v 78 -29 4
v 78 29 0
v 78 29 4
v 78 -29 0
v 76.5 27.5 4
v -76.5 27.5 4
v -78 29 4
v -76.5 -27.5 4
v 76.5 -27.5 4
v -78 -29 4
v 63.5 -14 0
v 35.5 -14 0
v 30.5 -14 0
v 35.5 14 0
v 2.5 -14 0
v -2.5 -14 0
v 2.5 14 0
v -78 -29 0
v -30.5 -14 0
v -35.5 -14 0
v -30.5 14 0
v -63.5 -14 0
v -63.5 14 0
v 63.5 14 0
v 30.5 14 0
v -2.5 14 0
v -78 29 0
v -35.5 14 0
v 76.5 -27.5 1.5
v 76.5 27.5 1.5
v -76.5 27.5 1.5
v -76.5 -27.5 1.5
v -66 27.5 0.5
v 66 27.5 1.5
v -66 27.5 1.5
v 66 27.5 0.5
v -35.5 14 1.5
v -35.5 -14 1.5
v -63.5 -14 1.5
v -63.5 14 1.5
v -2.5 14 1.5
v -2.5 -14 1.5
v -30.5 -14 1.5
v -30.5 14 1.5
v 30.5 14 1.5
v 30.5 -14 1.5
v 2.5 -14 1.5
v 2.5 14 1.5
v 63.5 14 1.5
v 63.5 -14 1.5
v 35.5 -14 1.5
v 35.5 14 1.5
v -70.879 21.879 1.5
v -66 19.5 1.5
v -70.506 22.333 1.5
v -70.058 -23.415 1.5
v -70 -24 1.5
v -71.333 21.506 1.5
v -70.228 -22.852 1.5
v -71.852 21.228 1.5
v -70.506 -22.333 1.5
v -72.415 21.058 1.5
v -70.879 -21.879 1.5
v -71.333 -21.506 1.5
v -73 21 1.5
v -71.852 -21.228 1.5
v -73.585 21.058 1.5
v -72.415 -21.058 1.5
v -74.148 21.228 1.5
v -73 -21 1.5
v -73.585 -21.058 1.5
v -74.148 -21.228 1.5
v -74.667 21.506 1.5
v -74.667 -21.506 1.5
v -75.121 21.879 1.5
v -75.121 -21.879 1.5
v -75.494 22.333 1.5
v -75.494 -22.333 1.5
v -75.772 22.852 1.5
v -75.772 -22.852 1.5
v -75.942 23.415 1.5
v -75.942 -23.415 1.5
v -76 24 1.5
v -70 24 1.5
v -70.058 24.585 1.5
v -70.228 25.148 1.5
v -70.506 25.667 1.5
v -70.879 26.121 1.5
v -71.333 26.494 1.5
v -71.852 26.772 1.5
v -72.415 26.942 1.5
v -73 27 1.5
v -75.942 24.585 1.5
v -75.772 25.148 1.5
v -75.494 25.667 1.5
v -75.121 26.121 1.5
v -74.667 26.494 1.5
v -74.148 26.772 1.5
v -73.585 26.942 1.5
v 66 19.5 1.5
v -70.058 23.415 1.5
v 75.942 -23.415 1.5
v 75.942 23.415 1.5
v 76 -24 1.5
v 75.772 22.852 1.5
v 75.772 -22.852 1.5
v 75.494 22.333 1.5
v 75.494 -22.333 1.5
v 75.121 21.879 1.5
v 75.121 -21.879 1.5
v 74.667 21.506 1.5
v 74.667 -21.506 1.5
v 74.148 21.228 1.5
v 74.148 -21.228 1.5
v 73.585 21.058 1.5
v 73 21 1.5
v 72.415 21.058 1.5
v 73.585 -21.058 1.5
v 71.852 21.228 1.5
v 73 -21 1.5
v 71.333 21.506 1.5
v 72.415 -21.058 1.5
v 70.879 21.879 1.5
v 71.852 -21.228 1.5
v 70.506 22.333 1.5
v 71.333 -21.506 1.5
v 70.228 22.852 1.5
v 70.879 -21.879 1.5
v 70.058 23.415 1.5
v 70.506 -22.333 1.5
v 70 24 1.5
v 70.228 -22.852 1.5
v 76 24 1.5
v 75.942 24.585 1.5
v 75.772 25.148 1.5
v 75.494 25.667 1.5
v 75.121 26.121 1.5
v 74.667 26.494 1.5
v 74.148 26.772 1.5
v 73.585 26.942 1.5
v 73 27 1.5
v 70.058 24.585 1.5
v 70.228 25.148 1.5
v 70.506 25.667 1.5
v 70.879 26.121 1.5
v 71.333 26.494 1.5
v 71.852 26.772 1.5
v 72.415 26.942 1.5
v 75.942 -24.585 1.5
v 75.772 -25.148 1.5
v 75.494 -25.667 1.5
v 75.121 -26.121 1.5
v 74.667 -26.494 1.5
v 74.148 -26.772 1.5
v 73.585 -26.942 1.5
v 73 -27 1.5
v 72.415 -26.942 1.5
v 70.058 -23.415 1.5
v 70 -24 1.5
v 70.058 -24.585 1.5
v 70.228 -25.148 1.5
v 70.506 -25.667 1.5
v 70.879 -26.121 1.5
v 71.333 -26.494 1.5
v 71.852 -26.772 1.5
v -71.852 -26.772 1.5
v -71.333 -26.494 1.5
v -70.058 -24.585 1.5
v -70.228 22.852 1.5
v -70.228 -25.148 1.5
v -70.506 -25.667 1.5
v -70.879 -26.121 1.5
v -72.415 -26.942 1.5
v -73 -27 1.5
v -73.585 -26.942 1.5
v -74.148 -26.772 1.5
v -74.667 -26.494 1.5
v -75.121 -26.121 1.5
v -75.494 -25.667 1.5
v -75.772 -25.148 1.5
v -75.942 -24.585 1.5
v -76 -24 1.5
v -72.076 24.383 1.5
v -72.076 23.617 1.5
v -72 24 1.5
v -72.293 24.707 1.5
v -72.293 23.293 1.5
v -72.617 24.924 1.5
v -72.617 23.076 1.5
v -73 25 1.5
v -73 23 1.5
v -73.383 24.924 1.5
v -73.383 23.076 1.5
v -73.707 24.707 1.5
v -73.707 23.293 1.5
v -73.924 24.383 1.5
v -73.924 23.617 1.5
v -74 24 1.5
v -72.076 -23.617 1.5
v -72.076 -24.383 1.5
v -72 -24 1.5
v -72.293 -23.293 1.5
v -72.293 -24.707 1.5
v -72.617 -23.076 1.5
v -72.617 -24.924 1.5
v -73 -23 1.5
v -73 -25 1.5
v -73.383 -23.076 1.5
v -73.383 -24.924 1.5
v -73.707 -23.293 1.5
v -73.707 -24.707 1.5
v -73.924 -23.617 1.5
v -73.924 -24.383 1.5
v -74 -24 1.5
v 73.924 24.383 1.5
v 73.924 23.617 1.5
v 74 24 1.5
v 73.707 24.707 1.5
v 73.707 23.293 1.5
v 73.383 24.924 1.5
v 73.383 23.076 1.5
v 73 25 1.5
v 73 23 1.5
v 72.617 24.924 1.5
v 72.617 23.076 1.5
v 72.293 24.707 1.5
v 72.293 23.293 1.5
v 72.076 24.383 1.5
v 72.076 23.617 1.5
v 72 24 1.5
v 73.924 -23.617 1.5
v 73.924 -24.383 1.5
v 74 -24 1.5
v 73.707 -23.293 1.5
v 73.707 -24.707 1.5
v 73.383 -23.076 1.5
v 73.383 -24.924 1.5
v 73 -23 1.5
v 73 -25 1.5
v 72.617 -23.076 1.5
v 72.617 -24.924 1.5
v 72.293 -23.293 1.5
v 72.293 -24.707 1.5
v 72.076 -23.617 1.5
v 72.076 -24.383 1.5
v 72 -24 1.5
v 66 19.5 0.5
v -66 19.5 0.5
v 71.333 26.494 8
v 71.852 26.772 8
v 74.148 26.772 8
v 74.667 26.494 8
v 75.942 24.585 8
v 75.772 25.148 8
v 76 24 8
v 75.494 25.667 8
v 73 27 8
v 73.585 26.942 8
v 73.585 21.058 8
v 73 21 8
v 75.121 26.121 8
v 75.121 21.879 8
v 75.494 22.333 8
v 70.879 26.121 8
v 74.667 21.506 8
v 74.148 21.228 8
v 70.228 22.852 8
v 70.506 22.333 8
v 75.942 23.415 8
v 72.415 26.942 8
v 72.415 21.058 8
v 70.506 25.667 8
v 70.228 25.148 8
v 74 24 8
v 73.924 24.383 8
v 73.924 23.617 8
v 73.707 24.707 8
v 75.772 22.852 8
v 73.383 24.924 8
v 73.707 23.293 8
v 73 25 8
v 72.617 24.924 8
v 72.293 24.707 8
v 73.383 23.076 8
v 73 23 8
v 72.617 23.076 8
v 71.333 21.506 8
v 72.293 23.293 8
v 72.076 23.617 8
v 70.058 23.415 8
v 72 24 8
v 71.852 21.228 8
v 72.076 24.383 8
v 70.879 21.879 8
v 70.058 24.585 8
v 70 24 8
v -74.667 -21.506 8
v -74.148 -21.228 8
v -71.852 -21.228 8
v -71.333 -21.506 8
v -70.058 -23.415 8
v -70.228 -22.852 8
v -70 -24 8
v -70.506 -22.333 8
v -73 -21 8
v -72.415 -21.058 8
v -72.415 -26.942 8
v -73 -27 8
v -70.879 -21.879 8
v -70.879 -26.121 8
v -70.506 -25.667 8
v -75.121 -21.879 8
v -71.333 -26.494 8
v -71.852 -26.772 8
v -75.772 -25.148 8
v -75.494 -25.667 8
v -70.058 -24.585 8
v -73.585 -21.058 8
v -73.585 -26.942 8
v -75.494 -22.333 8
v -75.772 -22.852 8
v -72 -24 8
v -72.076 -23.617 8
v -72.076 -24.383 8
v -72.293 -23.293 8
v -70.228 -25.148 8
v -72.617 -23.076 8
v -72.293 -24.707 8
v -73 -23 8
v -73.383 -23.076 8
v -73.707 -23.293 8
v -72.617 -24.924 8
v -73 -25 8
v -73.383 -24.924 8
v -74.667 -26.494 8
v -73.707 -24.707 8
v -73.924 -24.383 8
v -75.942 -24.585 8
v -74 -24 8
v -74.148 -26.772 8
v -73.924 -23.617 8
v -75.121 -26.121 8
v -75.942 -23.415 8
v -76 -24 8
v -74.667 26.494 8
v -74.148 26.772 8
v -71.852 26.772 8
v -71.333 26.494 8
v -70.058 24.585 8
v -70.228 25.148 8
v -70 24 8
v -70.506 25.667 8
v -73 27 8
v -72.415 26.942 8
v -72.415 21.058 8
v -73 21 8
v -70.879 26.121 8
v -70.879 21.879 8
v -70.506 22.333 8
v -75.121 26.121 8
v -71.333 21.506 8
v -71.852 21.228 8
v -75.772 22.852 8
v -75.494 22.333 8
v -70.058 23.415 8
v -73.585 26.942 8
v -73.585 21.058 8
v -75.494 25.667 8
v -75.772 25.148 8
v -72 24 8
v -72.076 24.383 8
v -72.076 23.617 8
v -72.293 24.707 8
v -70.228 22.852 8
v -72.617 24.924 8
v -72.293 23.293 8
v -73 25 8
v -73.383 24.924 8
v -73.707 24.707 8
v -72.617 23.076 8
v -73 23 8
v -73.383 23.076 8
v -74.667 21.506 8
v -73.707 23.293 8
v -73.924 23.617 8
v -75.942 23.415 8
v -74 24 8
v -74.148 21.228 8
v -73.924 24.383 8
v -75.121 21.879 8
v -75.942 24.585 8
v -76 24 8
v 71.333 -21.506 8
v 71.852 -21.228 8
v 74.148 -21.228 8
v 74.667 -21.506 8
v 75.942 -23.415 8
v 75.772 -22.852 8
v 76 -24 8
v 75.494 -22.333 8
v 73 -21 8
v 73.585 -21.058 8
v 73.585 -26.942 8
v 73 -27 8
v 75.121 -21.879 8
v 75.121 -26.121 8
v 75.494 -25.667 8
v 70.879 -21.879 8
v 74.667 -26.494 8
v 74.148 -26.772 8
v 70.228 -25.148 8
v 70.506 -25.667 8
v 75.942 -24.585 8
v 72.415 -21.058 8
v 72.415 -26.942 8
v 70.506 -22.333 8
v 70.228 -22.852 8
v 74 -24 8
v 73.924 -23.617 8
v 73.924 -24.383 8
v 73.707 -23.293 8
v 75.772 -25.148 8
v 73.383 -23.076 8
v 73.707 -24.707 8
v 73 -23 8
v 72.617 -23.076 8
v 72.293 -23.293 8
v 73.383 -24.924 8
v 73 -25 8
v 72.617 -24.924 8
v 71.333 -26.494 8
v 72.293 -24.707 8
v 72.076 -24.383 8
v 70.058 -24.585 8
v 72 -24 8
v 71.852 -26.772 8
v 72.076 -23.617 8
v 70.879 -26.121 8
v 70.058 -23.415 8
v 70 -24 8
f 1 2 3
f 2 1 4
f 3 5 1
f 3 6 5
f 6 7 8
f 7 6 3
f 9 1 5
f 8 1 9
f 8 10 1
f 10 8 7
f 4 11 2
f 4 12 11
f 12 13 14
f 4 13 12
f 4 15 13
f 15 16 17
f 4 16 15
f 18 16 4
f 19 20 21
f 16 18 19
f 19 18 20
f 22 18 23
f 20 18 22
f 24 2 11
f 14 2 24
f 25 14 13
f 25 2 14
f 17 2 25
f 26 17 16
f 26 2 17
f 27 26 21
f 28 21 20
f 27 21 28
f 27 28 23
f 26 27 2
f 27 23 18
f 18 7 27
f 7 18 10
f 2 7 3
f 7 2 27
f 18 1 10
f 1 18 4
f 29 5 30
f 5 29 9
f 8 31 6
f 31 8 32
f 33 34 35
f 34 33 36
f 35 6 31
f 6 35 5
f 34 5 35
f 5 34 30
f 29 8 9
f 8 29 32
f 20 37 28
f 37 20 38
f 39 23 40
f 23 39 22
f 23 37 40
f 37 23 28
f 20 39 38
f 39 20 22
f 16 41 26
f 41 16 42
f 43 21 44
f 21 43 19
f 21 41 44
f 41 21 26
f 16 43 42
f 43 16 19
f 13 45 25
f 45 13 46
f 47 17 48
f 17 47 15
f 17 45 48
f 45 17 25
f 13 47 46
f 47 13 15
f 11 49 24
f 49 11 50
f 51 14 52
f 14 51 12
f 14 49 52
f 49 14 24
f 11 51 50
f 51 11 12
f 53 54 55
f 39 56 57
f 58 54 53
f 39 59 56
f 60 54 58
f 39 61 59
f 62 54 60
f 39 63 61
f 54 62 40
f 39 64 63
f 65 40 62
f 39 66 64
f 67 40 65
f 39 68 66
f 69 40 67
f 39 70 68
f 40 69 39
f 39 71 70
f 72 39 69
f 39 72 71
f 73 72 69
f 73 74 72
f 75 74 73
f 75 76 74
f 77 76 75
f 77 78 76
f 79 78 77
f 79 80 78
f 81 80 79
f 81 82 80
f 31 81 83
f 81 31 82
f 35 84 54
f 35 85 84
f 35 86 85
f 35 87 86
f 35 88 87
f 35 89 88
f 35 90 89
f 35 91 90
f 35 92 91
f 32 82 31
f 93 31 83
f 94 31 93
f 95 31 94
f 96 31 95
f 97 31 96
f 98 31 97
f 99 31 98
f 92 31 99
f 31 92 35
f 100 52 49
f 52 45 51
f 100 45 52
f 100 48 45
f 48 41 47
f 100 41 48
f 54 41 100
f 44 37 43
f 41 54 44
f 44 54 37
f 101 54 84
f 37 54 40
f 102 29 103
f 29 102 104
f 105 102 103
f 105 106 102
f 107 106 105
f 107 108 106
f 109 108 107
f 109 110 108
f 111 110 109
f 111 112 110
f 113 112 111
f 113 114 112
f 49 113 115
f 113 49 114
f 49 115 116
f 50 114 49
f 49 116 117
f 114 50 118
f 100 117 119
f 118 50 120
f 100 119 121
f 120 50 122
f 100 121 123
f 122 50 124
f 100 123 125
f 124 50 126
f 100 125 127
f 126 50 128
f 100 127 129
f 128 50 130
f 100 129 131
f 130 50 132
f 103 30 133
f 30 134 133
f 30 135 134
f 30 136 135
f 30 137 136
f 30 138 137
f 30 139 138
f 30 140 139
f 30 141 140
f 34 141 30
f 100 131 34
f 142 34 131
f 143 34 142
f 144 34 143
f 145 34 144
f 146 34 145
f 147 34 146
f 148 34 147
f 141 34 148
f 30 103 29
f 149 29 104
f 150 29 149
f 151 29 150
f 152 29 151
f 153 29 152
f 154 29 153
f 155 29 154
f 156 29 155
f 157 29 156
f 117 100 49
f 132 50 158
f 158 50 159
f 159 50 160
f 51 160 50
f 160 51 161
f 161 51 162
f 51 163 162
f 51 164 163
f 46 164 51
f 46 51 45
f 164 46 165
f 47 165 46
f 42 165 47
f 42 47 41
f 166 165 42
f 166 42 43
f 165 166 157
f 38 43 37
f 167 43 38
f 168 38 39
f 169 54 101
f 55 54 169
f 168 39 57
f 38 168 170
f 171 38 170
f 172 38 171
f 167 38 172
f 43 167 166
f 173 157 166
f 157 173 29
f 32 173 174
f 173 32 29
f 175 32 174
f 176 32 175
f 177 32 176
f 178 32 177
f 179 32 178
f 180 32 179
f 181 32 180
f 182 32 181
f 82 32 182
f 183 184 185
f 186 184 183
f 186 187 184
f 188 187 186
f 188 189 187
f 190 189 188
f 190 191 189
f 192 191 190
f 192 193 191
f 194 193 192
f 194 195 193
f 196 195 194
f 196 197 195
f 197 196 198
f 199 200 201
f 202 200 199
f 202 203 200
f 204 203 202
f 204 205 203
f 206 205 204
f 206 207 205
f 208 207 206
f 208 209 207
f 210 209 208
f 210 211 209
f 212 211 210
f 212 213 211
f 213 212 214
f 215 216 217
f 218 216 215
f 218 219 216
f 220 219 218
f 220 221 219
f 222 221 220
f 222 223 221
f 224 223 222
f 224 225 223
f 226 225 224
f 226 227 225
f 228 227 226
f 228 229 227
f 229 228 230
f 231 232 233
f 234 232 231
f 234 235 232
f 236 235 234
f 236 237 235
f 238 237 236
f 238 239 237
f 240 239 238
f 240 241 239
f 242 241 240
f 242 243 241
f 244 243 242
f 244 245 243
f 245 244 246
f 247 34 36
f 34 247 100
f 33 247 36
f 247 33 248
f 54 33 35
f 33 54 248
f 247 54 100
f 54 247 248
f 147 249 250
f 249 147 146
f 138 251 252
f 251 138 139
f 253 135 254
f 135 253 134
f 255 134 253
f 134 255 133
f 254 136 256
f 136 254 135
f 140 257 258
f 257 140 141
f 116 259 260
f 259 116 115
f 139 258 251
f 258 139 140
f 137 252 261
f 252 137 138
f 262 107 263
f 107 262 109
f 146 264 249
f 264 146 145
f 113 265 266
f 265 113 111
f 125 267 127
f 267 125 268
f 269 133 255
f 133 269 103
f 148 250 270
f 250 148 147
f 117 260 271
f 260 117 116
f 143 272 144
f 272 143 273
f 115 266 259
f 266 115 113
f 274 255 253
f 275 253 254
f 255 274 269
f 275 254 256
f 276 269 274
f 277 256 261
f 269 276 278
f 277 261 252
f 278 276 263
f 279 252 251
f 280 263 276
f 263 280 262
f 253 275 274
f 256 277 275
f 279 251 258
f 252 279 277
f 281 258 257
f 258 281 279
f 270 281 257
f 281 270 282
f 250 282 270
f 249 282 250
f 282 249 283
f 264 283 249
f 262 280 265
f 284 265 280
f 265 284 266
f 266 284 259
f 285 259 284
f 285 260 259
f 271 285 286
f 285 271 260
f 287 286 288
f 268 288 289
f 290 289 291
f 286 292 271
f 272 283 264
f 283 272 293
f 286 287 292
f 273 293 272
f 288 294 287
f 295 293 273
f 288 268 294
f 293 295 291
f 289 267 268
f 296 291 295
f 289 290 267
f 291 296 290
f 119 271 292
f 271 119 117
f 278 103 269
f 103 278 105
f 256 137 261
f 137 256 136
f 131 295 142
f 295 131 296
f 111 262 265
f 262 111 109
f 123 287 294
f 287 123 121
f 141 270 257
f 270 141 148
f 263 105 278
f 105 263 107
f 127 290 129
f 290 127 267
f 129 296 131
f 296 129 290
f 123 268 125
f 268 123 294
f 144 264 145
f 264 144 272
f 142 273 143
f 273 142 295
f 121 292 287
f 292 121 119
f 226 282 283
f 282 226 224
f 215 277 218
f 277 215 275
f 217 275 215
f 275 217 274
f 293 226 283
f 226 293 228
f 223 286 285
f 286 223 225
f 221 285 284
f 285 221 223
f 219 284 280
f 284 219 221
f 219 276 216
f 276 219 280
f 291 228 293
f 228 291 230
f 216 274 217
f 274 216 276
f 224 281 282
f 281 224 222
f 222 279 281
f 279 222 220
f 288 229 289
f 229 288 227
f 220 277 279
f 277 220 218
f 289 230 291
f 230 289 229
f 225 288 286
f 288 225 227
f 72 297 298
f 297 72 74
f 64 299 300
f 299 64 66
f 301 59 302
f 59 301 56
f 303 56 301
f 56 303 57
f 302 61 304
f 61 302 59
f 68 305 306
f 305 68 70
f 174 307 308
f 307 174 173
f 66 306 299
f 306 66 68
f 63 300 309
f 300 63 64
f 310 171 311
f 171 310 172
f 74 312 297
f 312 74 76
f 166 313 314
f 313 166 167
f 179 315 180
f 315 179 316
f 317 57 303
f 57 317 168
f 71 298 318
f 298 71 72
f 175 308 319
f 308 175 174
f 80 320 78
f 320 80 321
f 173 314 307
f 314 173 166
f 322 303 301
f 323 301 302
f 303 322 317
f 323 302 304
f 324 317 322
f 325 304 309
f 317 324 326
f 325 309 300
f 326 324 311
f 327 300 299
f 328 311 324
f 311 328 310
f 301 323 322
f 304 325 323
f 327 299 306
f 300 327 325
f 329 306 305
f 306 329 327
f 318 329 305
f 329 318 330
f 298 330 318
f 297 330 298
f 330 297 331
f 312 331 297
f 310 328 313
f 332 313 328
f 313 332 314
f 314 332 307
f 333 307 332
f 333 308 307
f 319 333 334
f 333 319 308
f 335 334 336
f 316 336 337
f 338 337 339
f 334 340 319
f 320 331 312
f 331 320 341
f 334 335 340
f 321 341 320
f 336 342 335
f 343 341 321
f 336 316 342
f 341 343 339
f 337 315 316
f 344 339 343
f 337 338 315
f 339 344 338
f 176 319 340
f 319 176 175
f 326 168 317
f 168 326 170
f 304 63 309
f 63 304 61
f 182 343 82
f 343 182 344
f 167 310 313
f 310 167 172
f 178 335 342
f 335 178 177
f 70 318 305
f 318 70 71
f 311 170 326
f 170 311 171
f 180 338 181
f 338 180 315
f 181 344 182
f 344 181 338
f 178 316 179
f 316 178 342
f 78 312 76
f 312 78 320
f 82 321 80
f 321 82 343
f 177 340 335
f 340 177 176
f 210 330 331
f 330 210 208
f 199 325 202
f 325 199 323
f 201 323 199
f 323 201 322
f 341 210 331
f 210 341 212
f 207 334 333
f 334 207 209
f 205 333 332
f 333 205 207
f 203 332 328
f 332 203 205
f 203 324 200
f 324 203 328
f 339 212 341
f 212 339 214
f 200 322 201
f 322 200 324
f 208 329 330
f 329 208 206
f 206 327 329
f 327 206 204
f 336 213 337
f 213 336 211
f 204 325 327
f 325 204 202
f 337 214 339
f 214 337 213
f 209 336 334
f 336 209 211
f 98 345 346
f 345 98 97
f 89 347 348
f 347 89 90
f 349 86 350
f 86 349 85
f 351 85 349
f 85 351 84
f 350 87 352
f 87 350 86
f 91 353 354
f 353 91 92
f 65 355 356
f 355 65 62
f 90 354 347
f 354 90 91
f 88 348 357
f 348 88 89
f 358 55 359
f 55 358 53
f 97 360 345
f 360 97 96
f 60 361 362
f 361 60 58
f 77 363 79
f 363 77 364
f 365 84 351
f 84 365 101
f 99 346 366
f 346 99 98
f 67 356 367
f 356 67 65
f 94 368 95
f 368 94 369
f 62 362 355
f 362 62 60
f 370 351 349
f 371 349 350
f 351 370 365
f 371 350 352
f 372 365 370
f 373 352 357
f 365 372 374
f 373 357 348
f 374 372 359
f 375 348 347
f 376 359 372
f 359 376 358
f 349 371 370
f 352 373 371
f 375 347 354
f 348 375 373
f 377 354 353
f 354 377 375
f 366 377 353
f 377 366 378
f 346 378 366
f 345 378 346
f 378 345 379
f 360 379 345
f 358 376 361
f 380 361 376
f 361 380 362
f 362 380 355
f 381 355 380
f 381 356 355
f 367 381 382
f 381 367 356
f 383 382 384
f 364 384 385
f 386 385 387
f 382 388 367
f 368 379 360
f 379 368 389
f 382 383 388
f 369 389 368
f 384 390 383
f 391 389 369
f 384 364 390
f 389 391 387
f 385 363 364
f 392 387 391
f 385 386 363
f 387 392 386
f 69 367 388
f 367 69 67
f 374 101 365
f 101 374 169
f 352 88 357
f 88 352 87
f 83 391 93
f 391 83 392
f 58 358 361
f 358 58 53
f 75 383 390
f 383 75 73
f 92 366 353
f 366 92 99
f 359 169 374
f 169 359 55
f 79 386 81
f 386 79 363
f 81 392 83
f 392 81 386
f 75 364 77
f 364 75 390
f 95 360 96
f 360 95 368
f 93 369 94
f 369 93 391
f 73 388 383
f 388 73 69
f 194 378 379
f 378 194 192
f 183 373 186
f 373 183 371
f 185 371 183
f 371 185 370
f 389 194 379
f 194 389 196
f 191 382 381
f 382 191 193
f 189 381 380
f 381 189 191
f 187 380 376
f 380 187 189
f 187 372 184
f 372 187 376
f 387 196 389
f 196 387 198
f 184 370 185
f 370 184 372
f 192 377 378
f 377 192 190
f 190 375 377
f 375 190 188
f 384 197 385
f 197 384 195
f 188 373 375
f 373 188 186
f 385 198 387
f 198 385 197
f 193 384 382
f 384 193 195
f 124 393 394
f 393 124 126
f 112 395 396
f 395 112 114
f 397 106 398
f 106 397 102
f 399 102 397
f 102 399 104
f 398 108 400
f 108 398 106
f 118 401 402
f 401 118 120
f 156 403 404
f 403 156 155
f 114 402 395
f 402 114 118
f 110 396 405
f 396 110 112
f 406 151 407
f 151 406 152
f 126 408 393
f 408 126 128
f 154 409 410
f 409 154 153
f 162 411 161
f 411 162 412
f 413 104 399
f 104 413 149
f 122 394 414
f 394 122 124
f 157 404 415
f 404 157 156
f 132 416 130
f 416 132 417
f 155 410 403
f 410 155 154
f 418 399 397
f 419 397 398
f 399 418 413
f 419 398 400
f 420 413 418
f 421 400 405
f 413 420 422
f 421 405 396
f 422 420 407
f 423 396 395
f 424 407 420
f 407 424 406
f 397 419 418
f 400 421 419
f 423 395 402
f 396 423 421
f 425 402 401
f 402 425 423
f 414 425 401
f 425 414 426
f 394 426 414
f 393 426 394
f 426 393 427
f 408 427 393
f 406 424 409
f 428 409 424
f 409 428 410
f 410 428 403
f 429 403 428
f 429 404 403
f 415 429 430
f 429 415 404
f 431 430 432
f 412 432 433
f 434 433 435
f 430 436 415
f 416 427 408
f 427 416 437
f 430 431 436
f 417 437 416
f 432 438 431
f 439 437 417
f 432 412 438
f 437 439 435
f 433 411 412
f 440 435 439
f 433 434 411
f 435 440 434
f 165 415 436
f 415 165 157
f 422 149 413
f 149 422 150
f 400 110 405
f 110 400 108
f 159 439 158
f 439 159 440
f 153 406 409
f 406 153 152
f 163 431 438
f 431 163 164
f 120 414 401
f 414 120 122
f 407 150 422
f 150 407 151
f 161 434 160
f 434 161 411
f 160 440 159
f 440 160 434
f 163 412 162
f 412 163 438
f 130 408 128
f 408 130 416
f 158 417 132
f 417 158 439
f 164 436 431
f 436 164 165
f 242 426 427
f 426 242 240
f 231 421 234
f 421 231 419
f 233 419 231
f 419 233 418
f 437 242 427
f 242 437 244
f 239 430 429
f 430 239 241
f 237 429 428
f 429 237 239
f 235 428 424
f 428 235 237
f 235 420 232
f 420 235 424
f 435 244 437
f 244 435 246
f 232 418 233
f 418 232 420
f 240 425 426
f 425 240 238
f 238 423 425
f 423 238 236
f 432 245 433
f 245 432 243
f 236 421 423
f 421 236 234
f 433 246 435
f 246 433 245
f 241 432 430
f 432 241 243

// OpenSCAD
L0=33;
L1=24;
L2=4*L0+L1;
W0=48;
W1=10;
W2=W0+W1;
T=1.5;
H=13.5;
H2=4;

difference() {
    cube_center([L2,W2,H2]);
    cube_center([L2-2*T,W2-2*T,6]);
}

difference() {
cube_center([L2,W2,1.5]);
    
translate([0,0,0]) {
translate([-L0/2-L0,0,0])
digit();
translate([-L0/2,0,0])
digit();
translate([L0/2,0,0])
digit();
translate([L0/2+L0,0,0])
digit();
}

translate([0,23.5,0.5])
cube_center([L0*4,8,3]);

}

covermount();

module covermount() {
translate([L2/2-5,W2/2-5,0])
standoff(h=8,od=6,id=2);
    translate([-L2/2+5,-W2/2+5,0])
standoff(h=8,od=6,id=2);
    translate([-L2/2+5,W2/2-5,0])
standoff(h=8,od=6,id=2);
    translate([L2/2-5,-W2/2+5,0])
standoff(h=8,od=6,id=2);
}

module digit() {
        translate([0,0,0])
        cube_center([28,28,3]);
}

module standoff(od=5,id=2.5,h=12 ) {
    difference() {
    cylinder(d=od,h=h,$fn=32);
    cylinder(d=id,h=h+0.001,$fn=16);
    }
}
module cube_center(dims) {
  translate([0,0,dims[2]/2])
    cube(dims,center=true);
}
